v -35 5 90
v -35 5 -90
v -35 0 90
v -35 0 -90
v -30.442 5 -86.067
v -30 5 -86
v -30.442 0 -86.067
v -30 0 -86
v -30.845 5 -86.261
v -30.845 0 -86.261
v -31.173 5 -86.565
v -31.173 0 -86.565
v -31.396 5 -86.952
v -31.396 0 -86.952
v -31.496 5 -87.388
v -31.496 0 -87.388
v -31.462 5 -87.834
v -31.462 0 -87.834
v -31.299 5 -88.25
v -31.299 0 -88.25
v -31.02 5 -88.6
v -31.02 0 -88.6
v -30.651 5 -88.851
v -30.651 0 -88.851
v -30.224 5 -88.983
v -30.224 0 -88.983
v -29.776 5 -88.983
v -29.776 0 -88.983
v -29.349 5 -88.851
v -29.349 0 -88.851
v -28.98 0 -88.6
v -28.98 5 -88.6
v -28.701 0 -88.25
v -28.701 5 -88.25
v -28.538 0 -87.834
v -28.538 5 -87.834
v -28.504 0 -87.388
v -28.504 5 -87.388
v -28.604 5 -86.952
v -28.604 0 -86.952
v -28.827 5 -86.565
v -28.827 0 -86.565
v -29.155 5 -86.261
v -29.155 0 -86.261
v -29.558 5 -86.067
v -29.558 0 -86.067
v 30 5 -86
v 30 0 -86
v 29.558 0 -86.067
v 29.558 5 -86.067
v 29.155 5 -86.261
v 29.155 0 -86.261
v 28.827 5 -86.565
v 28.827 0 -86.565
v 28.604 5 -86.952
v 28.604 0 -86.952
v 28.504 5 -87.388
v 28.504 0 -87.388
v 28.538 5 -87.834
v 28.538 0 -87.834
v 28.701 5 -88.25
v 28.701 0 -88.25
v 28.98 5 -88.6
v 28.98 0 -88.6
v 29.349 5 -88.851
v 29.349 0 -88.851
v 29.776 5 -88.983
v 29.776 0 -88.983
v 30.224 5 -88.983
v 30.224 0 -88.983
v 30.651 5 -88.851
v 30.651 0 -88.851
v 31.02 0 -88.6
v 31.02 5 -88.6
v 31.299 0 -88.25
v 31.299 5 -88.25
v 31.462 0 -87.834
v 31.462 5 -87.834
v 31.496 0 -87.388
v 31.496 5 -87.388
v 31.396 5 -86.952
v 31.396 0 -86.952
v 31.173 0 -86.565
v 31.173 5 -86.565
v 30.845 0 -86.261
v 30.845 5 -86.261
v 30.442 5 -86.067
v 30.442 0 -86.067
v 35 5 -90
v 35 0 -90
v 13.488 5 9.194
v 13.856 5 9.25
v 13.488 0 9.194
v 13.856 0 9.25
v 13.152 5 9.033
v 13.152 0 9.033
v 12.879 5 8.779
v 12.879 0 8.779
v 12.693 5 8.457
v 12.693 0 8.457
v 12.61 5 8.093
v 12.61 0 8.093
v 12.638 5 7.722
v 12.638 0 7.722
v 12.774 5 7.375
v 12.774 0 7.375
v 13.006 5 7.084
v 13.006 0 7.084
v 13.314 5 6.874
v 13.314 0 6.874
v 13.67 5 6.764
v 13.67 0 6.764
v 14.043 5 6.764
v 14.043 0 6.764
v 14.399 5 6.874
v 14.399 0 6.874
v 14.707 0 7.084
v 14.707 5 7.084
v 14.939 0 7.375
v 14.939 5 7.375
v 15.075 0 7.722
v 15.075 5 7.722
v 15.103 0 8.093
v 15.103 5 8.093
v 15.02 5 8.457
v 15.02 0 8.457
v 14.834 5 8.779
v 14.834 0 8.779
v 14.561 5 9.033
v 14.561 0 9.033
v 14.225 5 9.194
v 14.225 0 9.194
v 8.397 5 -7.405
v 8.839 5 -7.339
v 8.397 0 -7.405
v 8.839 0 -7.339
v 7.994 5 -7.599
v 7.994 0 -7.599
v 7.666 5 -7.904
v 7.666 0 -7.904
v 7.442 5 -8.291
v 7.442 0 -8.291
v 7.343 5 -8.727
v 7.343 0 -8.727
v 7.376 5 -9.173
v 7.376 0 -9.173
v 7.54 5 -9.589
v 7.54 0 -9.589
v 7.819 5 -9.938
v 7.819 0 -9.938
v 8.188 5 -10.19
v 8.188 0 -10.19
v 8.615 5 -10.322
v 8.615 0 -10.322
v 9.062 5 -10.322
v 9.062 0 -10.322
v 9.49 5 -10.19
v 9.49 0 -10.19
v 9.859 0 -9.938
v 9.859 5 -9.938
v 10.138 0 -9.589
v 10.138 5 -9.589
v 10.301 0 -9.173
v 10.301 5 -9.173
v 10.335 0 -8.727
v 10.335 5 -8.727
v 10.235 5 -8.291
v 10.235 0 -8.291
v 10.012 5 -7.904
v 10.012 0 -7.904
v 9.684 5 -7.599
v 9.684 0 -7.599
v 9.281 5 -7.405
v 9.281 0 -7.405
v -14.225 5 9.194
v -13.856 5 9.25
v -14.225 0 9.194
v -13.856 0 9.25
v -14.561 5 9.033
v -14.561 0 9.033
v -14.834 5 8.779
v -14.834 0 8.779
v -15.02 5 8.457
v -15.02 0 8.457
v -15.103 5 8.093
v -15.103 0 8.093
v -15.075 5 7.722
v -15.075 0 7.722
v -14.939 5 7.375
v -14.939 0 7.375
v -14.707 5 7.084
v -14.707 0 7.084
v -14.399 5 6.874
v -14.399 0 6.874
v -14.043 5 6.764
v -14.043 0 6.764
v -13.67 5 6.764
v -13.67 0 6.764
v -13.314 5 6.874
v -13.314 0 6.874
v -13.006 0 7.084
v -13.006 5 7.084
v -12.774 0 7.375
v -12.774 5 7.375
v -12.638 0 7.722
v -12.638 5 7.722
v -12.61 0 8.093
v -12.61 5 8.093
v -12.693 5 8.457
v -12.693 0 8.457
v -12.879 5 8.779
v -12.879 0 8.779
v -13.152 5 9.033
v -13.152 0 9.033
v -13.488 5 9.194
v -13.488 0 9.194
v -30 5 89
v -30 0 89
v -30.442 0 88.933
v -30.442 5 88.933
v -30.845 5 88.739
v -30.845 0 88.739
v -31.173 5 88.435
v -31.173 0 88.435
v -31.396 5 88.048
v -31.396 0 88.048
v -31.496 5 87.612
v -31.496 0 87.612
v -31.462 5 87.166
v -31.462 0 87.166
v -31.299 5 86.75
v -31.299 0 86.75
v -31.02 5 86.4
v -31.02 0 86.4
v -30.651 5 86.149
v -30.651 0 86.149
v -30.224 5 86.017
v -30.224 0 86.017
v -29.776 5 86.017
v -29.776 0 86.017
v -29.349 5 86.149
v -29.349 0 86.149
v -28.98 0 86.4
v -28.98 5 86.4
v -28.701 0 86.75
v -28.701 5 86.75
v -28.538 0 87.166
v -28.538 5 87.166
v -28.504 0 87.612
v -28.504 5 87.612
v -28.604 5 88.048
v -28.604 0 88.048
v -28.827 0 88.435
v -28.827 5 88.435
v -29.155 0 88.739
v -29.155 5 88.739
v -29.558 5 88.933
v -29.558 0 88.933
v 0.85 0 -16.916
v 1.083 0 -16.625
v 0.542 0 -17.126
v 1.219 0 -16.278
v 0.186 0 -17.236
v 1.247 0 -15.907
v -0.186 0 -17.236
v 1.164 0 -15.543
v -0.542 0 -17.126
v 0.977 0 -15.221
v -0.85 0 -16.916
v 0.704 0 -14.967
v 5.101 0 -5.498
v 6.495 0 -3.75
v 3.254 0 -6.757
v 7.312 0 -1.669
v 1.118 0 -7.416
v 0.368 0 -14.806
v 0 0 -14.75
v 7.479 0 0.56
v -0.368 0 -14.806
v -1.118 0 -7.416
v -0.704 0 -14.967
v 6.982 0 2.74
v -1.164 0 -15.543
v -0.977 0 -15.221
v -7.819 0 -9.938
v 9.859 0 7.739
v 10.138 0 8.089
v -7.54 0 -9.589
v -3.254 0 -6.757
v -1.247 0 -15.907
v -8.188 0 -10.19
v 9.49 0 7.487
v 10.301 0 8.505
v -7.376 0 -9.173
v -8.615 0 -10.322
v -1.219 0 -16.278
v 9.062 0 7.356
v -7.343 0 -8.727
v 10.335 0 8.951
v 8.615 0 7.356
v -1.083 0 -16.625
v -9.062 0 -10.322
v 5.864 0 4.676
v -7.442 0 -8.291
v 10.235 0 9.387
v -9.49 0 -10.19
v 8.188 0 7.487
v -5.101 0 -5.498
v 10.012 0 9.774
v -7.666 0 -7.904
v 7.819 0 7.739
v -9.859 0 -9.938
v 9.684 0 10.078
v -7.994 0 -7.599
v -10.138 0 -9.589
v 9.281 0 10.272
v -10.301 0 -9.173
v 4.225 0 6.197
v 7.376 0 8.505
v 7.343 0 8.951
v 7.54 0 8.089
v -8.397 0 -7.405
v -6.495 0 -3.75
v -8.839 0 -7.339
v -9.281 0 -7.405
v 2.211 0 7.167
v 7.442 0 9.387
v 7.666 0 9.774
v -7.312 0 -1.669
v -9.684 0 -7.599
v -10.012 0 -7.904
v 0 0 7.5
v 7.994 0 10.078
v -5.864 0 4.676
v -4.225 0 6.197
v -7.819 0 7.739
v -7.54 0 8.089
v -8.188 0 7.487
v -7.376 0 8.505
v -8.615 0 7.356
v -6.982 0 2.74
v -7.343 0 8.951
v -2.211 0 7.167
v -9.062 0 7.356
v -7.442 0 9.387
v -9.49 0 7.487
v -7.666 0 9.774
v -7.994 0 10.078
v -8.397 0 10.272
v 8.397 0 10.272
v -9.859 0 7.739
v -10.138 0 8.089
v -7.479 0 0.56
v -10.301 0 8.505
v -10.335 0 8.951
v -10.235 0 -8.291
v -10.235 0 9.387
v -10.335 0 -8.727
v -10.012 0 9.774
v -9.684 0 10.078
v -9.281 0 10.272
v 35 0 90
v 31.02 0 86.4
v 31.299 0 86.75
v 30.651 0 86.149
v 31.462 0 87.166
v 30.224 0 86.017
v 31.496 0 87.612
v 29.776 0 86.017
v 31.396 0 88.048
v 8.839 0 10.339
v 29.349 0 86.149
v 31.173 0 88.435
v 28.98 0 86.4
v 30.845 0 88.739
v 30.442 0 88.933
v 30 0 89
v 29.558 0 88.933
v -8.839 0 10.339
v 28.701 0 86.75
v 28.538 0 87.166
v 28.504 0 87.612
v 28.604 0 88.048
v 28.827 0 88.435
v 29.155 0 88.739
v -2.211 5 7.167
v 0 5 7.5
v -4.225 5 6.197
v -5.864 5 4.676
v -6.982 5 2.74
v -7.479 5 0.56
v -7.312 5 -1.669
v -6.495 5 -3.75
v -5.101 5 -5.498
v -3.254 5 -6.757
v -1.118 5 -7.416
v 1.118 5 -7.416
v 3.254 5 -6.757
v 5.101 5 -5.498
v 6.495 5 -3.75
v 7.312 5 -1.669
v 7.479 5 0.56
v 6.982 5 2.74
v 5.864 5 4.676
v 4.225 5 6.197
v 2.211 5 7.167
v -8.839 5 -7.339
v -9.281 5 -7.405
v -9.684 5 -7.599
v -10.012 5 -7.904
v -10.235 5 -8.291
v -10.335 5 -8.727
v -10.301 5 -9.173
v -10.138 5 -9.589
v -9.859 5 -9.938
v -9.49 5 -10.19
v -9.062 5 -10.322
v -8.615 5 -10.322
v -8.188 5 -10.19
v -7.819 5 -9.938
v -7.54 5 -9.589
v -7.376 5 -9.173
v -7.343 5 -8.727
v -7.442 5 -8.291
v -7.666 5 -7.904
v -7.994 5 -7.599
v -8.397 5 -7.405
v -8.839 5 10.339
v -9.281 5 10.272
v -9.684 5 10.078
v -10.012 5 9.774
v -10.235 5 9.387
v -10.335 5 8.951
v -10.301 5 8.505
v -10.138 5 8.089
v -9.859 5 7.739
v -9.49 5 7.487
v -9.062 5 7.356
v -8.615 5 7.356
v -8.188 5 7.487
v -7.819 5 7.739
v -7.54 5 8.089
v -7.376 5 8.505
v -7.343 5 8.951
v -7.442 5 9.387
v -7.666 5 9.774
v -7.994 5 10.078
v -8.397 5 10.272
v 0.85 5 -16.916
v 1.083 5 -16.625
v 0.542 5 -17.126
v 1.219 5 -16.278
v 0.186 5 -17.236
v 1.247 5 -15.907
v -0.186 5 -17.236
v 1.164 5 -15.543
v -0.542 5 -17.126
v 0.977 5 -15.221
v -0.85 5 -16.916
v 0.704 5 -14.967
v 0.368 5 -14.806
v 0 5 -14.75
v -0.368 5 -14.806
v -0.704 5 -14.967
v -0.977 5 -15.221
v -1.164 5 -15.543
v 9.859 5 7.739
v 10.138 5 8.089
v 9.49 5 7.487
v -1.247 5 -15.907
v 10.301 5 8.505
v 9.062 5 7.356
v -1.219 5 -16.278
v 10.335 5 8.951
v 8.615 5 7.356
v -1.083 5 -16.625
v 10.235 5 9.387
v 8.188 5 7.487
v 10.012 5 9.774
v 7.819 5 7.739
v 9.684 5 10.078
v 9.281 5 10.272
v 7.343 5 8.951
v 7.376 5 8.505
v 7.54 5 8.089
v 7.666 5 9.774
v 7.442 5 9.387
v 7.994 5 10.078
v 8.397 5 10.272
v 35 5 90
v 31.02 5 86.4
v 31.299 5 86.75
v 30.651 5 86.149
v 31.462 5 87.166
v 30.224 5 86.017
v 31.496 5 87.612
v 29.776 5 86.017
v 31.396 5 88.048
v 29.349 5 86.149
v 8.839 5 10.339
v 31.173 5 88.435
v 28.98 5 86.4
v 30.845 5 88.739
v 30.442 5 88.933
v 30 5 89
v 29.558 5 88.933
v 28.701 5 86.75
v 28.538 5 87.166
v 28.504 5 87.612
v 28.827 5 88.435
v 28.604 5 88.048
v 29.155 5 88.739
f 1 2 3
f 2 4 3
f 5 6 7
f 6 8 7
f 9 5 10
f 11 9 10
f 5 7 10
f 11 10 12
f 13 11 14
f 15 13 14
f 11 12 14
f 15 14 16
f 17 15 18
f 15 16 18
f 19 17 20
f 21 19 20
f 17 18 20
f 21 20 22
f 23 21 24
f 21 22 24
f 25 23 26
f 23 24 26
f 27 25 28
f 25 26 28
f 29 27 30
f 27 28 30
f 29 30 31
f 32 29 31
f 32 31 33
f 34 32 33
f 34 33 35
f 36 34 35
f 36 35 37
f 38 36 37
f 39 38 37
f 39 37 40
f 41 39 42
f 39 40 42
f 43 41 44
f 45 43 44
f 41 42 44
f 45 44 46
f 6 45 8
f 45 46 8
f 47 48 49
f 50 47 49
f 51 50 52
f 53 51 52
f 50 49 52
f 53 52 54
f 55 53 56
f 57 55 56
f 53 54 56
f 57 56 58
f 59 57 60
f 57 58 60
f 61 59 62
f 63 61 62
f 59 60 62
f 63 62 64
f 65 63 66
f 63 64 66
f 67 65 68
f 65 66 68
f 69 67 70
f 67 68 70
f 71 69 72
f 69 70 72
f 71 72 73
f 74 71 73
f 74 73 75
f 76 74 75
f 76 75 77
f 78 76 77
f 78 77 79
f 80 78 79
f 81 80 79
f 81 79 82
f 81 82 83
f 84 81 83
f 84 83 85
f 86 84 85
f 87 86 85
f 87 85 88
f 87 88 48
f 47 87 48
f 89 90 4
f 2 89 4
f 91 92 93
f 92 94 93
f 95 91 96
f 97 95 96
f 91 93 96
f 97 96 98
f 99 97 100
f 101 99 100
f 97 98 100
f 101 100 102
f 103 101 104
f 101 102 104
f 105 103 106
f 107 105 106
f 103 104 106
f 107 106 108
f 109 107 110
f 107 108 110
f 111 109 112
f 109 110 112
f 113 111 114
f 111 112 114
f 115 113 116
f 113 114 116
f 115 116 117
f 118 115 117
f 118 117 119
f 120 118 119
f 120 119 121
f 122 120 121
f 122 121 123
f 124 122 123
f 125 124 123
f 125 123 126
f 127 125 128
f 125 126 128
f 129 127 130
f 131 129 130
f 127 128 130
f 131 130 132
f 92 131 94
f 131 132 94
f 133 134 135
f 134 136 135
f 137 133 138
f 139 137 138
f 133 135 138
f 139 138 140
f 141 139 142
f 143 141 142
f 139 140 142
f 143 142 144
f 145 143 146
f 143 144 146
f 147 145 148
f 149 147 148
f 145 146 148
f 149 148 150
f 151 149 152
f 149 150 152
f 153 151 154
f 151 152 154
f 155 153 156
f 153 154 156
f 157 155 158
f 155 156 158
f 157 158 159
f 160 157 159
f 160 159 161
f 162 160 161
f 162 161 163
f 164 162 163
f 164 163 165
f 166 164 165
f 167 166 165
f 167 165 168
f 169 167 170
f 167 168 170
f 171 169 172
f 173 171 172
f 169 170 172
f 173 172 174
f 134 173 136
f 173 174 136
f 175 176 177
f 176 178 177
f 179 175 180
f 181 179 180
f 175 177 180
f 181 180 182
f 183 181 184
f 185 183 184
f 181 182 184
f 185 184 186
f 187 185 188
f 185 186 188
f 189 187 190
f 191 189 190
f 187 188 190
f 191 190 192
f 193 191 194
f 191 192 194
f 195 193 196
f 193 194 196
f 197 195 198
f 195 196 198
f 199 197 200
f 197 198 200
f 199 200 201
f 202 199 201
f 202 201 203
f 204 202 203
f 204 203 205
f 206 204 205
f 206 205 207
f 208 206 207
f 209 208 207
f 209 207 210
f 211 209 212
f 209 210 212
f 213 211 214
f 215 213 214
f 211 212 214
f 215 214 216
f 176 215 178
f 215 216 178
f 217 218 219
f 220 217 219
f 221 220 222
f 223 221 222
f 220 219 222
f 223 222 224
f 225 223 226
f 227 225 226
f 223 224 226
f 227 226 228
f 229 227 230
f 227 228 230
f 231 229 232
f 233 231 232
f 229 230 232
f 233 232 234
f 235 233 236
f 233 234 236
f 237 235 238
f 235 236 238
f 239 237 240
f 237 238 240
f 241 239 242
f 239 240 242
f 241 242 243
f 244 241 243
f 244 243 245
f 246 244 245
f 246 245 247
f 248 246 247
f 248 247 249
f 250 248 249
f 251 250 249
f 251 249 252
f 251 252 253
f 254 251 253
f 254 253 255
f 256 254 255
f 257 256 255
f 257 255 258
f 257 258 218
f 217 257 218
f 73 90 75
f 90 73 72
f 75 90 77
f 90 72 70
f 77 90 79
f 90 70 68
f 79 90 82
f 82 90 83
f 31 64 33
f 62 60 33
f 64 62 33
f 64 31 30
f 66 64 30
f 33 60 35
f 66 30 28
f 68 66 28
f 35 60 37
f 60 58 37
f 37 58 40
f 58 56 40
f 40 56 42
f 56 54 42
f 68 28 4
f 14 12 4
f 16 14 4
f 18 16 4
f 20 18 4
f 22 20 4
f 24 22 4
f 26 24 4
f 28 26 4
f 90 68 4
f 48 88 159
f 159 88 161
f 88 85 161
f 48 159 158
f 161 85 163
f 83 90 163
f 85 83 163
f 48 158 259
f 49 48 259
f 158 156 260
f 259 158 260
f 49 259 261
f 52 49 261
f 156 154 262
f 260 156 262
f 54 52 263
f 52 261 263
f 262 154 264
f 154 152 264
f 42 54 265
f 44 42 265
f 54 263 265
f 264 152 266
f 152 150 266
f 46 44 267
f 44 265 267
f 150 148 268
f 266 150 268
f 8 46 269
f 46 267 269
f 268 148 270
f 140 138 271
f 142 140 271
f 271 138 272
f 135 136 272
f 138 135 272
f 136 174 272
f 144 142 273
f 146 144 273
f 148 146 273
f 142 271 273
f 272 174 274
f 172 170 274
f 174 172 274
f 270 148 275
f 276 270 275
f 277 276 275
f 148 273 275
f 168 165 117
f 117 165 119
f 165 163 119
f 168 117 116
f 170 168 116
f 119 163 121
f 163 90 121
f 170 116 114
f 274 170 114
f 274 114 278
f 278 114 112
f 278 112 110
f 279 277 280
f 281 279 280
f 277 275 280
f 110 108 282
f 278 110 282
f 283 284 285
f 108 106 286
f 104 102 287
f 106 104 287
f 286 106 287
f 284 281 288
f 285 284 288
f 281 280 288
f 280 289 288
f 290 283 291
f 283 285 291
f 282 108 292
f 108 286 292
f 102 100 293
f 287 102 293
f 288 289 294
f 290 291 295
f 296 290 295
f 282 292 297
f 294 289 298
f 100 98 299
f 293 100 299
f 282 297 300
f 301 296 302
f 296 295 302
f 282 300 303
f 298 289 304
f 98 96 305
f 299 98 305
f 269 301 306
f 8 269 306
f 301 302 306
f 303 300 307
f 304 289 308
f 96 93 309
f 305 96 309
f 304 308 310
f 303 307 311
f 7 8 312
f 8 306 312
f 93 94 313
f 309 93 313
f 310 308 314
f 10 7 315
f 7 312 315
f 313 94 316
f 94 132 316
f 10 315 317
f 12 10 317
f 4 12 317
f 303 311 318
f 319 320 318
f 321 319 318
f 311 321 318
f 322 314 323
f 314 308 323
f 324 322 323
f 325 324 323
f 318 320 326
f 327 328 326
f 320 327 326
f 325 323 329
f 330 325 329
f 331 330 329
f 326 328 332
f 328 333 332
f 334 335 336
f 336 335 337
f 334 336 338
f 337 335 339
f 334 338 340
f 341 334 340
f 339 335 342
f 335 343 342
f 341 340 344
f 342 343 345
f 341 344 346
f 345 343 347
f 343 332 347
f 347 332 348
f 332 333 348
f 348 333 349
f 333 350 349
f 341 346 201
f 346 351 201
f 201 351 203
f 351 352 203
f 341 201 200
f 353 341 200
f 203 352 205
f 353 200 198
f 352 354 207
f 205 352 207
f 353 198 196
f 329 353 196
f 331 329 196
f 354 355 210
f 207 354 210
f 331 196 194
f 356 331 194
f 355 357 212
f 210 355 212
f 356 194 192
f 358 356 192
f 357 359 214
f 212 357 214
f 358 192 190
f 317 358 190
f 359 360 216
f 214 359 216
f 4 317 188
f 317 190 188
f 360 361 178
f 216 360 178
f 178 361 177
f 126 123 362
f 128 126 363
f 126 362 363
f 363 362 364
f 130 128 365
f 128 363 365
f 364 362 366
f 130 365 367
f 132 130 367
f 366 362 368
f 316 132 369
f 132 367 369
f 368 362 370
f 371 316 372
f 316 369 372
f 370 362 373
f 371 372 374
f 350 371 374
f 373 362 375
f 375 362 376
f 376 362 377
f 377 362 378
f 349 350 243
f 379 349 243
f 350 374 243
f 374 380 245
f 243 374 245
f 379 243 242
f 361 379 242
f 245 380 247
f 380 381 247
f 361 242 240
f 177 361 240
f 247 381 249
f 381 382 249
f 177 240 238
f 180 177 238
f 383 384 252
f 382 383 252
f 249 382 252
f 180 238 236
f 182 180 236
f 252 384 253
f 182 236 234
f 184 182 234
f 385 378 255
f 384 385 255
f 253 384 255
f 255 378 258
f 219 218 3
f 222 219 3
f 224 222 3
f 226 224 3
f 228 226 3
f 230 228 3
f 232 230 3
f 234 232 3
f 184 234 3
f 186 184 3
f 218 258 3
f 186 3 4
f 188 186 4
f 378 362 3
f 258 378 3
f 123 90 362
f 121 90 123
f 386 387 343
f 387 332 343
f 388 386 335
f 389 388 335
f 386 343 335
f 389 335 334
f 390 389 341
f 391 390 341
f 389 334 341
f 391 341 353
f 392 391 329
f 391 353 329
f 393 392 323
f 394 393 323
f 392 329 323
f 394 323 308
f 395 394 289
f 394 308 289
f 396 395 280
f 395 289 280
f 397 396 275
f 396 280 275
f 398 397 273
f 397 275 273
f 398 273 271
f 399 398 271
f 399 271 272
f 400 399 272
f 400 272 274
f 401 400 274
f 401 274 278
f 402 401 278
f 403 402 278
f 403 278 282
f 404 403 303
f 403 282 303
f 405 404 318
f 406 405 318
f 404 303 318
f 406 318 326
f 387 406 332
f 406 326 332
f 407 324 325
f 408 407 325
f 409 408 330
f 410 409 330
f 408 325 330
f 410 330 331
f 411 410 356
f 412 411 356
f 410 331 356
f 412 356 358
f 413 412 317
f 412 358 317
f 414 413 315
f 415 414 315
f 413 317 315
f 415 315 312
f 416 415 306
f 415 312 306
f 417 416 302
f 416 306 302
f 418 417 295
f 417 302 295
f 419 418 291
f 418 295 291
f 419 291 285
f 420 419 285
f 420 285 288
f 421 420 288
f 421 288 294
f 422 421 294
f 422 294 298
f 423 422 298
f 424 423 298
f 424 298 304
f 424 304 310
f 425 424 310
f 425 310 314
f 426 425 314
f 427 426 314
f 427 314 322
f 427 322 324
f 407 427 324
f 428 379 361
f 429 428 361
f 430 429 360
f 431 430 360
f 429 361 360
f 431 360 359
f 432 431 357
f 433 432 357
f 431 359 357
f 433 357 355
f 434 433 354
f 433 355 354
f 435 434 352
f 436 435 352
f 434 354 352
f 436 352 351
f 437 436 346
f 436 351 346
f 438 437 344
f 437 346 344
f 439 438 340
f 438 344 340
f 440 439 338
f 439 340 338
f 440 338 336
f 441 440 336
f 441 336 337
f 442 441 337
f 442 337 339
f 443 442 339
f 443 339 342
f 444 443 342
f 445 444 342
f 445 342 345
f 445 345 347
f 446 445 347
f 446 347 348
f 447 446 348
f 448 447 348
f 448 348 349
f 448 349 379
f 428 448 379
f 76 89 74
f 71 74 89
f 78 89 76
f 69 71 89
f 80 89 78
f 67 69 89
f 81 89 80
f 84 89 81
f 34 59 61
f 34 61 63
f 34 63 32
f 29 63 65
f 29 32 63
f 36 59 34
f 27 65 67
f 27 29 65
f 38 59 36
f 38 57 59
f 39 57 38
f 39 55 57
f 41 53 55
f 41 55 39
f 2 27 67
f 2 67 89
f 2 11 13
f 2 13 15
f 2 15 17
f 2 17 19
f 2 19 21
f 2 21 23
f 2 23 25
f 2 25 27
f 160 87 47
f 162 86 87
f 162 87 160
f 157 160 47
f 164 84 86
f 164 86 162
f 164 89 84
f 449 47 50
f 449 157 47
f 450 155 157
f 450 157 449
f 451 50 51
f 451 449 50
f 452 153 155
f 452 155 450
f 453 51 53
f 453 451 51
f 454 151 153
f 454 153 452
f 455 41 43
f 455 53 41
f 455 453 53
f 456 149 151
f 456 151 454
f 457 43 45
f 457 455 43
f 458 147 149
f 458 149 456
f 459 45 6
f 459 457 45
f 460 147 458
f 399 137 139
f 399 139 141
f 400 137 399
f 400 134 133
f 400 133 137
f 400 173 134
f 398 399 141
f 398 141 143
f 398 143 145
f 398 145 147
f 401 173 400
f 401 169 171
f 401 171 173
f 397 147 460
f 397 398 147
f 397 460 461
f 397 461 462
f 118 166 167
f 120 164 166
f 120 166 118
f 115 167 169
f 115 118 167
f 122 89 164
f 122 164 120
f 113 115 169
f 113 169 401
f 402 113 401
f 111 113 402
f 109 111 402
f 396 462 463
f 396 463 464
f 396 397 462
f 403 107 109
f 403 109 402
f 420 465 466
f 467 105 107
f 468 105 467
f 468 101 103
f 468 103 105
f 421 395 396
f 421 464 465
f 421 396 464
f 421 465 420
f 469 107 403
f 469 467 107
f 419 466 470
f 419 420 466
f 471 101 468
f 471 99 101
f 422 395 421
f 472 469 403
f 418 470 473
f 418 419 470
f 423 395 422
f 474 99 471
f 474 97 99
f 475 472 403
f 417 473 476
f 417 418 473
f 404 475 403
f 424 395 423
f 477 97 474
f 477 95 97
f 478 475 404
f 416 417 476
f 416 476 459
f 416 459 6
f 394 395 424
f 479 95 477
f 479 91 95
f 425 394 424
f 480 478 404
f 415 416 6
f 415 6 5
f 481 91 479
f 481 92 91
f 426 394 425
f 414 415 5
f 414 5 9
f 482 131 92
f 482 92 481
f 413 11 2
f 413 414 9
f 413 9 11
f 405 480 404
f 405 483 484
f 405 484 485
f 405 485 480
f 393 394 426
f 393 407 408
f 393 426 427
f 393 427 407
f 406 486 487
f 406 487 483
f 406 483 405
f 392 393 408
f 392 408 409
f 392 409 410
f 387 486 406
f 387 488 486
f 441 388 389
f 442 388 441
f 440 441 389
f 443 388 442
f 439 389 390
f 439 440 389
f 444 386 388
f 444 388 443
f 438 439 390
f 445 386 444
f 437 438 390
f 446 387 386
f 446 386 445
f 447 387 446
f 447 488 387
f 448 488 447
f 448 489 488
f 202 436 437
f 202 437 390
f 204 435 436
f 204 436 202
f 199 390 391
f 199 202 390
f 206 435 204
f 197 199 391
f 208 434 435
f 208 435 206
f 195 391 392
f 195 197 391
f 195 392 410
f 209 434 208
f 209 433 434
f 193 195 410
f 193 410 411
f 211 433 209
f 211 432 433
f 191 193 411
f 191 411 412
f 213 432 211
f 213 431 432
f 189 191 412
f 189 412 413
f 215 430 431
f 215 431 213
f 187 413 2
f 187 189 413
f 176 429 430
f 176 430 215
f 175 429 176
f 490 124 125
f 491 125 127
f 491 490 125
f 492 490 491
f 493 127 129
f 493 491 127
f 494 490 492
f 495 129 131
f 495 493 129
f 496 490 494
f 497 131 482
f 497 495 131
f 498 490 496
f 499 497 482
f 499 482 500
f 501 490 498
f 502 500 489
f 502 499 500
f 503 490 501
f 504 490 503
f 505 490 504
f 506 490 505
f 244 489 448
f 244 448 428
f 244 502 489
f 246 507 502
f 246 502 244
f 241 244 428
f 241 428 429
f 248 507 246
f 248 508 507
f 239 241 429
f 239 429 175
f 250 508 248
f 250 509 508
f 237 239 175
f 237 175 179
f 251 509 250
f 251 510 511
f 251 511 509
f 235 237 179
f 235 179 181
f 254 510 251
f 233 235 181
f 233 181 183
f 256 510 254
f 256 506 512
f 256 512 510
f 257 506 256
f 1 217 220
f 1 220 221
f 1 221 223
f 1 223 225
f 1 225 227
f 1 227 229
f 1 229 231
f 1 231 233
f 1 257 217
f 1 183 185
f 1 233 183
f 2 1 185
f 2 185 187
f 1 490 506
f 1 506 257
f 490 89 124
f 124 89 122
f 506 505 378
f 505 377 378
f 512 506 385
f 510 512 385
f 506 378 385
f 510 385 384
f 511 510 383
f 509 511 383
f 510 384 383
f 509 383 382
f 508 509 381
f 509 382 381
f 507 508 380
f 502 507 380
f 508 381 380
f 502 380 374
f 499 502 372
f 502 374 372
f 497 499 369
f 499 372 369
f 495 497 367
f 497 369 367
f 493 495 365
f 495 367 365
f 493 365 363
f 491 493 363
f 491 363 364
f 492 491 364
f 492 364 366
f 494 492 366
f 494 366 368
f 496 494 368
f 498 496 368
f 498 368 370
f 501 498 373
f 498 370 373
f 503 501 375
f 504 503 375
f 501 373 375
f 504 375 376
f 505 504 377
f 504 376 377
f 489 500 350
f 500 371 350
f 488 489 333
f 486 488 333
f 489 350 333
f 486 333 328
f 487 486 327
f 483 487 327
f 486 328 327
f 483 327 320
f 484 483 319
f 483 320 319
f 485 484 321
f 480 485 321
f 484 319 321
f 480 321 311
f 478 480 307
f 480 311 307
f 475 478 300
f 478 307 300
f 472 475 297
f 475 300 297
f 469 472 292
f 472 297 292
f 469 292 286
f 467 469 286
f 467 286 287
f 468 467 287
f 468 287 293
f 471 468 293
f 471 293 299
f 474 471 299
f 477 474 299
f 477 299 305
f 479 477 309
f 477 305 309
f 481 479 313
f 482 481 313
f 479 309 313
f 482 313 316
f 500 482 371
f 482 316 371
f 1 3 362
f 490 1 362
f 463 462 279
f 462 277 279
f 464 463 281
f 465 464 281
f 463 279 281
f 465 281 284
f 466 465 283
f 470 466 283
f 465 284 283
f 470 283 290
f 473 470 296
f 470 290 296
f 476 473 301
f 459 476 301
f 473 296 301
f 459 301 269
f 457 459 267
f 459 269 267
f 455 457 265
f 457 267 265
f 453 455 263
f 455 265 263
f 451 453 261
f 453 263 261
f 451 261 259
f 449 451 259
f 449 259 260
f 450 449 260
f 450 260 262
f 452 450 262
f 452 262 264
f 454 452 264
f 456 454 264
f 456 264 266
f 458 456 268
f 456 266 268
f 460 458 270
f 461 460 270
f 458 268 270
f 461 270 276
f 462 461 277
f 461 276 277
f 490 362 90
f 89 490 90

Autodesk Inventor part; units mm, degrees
ref_plane "YZ Plane" through (0, 0, 0) normal (1, 0, 0) x (0, 1, 0)
ref_plane "XZ Plane" through (0, 0, 0) normal (0, 1, 0) x (-1, 0, 0)
ref_plane "XY Plane" through (0, 0, 0) normal (0, 0, 1) x (1, 0, 0)
sketch "Sketch1" plane through (0, 0, 0) normal (0, 1, 0) x (-1, 0, 0)
  line L0 (35, 90) -> (-35, 90)
  line L1 (-35, 90) -> (-35, -90)
  line L2 (-35, -90) -> (35, -90)
  line L3 (35, -90) -> (35, 90)
  line L4 (69.6704, 0) -> (-52.4451, 0) projected
  line L5 (0, -129.3465) -> (0, 126.5577) projected
  point P0 (0, 0)
  dimension "d0" = 180
  dimension "d1" = 70
extrude "Extrusion1" add sketch "Sketch1" along normal blind 5
sketch "Sketch2" plane through (0, 5, 0) normal (0, 1, 0) x (1, 0, 0)
  line L0 (-35, 90) -> (-35, -90) projected
  line L1 (35, -90) -> (35, 90) projected
  line L2 (-35, -90) -> (35, -90) projected
  line L3 (-35, -90) -> (35, -90) projected
  line L4 (35, -90) -> (35, 90) projected
  line L5 (35, 90) -> (-35, 90) projected
  line L6 (-35, 90) -> (-35, -90) projected
  line L7 (-49, 0) -> (49, 0) projected
  line L8 (0, 126) -> (0, -126) projected
  point P0 (0, 0)
  point P1 (-30, -87.5)
  point P2 (-30, 87.5)
  point P3 (30, -87.5)
  point P4 (30, 87.5)
  dimension "d4" = 5
  dimension "d5" = 2.5
hole "Hole1" at (-30, 5, -87.5) at (30, 5, 87.5) at (30, 5, -87.5) at (-30, 5, 87.5) direction (0, -1, 0) diameter 3 depth 8.8 tip angle 118
sketch "Sketch3" plane through (0, 5, 0) normal (0, 1, 0) x (1, 0, 0)
  point P0 (0, 0)
hole "Hole2" at (0, 5, 0) direction (0, -1, 0) diameter 15 depth 14.2 tip angle 118
sketch "Sketch4" plane through (0, 5, 0) normal (0, 1, 0) x (1, 0, 0)
  circle A0 centre (0, 0) radius 7.5 projected
  line L0 (35, 90) -> (-35, 90) projected
  line L1 (-35, 90) -> (-35, -90) projected
  line L2 (-35, -90) -> (35, -90) projected
  circle A1 centre (0, 0) radius 12.5
  line L3 (-35, 0) -> (35, 0)
  line L4 (35, -90) -> (35, 90) projected
  line L5 (0, 90) -> (0, -90)
  point P0 (-8.8388, -8.8388)
  point P1 (8.8388, -8.8388)
  point P2 (-8.8388, 8.8388)
  point P3 (8.8388, 8.8388)
  dimension "d42" = 25
  dimension "d45" = 45
hole "Hole3" at (-8.8388, 5, 8.8388) at (-8.8388, 5, -8.8388) at (8.8388, 5, -8.8388) at (8.8388, 5, 8.8388) direction (0, -1, 0) diameter 3 end through all
sketch "Sketch5" plane through (0, 5, 0) normal (0, 1, 0) x (1, 0, 0)
  point P0 (0, 0)
sketch "Sketch6" plane through (0, 5, 0) normal (0, 1, 0) x (1, 0, 0)
  point P0 (0, 0)
  point P1 (0, 16)
  point P2 (-13.8564, -8)
  point P3 (0, 0)
  point P4 (13.8564, -8)
  point P5 (0, 0)
  dimension "d30" = 16
  dimension "d33" = 360
hole "Hole4" at (-13.8564, 5, 8) at (13.8564, 5, 8) at (0, 5, -16) direction (0, -1, 0) diameter 2.5 end through all
properties part number "옆판" material "Aluminum 6061-AHC"
